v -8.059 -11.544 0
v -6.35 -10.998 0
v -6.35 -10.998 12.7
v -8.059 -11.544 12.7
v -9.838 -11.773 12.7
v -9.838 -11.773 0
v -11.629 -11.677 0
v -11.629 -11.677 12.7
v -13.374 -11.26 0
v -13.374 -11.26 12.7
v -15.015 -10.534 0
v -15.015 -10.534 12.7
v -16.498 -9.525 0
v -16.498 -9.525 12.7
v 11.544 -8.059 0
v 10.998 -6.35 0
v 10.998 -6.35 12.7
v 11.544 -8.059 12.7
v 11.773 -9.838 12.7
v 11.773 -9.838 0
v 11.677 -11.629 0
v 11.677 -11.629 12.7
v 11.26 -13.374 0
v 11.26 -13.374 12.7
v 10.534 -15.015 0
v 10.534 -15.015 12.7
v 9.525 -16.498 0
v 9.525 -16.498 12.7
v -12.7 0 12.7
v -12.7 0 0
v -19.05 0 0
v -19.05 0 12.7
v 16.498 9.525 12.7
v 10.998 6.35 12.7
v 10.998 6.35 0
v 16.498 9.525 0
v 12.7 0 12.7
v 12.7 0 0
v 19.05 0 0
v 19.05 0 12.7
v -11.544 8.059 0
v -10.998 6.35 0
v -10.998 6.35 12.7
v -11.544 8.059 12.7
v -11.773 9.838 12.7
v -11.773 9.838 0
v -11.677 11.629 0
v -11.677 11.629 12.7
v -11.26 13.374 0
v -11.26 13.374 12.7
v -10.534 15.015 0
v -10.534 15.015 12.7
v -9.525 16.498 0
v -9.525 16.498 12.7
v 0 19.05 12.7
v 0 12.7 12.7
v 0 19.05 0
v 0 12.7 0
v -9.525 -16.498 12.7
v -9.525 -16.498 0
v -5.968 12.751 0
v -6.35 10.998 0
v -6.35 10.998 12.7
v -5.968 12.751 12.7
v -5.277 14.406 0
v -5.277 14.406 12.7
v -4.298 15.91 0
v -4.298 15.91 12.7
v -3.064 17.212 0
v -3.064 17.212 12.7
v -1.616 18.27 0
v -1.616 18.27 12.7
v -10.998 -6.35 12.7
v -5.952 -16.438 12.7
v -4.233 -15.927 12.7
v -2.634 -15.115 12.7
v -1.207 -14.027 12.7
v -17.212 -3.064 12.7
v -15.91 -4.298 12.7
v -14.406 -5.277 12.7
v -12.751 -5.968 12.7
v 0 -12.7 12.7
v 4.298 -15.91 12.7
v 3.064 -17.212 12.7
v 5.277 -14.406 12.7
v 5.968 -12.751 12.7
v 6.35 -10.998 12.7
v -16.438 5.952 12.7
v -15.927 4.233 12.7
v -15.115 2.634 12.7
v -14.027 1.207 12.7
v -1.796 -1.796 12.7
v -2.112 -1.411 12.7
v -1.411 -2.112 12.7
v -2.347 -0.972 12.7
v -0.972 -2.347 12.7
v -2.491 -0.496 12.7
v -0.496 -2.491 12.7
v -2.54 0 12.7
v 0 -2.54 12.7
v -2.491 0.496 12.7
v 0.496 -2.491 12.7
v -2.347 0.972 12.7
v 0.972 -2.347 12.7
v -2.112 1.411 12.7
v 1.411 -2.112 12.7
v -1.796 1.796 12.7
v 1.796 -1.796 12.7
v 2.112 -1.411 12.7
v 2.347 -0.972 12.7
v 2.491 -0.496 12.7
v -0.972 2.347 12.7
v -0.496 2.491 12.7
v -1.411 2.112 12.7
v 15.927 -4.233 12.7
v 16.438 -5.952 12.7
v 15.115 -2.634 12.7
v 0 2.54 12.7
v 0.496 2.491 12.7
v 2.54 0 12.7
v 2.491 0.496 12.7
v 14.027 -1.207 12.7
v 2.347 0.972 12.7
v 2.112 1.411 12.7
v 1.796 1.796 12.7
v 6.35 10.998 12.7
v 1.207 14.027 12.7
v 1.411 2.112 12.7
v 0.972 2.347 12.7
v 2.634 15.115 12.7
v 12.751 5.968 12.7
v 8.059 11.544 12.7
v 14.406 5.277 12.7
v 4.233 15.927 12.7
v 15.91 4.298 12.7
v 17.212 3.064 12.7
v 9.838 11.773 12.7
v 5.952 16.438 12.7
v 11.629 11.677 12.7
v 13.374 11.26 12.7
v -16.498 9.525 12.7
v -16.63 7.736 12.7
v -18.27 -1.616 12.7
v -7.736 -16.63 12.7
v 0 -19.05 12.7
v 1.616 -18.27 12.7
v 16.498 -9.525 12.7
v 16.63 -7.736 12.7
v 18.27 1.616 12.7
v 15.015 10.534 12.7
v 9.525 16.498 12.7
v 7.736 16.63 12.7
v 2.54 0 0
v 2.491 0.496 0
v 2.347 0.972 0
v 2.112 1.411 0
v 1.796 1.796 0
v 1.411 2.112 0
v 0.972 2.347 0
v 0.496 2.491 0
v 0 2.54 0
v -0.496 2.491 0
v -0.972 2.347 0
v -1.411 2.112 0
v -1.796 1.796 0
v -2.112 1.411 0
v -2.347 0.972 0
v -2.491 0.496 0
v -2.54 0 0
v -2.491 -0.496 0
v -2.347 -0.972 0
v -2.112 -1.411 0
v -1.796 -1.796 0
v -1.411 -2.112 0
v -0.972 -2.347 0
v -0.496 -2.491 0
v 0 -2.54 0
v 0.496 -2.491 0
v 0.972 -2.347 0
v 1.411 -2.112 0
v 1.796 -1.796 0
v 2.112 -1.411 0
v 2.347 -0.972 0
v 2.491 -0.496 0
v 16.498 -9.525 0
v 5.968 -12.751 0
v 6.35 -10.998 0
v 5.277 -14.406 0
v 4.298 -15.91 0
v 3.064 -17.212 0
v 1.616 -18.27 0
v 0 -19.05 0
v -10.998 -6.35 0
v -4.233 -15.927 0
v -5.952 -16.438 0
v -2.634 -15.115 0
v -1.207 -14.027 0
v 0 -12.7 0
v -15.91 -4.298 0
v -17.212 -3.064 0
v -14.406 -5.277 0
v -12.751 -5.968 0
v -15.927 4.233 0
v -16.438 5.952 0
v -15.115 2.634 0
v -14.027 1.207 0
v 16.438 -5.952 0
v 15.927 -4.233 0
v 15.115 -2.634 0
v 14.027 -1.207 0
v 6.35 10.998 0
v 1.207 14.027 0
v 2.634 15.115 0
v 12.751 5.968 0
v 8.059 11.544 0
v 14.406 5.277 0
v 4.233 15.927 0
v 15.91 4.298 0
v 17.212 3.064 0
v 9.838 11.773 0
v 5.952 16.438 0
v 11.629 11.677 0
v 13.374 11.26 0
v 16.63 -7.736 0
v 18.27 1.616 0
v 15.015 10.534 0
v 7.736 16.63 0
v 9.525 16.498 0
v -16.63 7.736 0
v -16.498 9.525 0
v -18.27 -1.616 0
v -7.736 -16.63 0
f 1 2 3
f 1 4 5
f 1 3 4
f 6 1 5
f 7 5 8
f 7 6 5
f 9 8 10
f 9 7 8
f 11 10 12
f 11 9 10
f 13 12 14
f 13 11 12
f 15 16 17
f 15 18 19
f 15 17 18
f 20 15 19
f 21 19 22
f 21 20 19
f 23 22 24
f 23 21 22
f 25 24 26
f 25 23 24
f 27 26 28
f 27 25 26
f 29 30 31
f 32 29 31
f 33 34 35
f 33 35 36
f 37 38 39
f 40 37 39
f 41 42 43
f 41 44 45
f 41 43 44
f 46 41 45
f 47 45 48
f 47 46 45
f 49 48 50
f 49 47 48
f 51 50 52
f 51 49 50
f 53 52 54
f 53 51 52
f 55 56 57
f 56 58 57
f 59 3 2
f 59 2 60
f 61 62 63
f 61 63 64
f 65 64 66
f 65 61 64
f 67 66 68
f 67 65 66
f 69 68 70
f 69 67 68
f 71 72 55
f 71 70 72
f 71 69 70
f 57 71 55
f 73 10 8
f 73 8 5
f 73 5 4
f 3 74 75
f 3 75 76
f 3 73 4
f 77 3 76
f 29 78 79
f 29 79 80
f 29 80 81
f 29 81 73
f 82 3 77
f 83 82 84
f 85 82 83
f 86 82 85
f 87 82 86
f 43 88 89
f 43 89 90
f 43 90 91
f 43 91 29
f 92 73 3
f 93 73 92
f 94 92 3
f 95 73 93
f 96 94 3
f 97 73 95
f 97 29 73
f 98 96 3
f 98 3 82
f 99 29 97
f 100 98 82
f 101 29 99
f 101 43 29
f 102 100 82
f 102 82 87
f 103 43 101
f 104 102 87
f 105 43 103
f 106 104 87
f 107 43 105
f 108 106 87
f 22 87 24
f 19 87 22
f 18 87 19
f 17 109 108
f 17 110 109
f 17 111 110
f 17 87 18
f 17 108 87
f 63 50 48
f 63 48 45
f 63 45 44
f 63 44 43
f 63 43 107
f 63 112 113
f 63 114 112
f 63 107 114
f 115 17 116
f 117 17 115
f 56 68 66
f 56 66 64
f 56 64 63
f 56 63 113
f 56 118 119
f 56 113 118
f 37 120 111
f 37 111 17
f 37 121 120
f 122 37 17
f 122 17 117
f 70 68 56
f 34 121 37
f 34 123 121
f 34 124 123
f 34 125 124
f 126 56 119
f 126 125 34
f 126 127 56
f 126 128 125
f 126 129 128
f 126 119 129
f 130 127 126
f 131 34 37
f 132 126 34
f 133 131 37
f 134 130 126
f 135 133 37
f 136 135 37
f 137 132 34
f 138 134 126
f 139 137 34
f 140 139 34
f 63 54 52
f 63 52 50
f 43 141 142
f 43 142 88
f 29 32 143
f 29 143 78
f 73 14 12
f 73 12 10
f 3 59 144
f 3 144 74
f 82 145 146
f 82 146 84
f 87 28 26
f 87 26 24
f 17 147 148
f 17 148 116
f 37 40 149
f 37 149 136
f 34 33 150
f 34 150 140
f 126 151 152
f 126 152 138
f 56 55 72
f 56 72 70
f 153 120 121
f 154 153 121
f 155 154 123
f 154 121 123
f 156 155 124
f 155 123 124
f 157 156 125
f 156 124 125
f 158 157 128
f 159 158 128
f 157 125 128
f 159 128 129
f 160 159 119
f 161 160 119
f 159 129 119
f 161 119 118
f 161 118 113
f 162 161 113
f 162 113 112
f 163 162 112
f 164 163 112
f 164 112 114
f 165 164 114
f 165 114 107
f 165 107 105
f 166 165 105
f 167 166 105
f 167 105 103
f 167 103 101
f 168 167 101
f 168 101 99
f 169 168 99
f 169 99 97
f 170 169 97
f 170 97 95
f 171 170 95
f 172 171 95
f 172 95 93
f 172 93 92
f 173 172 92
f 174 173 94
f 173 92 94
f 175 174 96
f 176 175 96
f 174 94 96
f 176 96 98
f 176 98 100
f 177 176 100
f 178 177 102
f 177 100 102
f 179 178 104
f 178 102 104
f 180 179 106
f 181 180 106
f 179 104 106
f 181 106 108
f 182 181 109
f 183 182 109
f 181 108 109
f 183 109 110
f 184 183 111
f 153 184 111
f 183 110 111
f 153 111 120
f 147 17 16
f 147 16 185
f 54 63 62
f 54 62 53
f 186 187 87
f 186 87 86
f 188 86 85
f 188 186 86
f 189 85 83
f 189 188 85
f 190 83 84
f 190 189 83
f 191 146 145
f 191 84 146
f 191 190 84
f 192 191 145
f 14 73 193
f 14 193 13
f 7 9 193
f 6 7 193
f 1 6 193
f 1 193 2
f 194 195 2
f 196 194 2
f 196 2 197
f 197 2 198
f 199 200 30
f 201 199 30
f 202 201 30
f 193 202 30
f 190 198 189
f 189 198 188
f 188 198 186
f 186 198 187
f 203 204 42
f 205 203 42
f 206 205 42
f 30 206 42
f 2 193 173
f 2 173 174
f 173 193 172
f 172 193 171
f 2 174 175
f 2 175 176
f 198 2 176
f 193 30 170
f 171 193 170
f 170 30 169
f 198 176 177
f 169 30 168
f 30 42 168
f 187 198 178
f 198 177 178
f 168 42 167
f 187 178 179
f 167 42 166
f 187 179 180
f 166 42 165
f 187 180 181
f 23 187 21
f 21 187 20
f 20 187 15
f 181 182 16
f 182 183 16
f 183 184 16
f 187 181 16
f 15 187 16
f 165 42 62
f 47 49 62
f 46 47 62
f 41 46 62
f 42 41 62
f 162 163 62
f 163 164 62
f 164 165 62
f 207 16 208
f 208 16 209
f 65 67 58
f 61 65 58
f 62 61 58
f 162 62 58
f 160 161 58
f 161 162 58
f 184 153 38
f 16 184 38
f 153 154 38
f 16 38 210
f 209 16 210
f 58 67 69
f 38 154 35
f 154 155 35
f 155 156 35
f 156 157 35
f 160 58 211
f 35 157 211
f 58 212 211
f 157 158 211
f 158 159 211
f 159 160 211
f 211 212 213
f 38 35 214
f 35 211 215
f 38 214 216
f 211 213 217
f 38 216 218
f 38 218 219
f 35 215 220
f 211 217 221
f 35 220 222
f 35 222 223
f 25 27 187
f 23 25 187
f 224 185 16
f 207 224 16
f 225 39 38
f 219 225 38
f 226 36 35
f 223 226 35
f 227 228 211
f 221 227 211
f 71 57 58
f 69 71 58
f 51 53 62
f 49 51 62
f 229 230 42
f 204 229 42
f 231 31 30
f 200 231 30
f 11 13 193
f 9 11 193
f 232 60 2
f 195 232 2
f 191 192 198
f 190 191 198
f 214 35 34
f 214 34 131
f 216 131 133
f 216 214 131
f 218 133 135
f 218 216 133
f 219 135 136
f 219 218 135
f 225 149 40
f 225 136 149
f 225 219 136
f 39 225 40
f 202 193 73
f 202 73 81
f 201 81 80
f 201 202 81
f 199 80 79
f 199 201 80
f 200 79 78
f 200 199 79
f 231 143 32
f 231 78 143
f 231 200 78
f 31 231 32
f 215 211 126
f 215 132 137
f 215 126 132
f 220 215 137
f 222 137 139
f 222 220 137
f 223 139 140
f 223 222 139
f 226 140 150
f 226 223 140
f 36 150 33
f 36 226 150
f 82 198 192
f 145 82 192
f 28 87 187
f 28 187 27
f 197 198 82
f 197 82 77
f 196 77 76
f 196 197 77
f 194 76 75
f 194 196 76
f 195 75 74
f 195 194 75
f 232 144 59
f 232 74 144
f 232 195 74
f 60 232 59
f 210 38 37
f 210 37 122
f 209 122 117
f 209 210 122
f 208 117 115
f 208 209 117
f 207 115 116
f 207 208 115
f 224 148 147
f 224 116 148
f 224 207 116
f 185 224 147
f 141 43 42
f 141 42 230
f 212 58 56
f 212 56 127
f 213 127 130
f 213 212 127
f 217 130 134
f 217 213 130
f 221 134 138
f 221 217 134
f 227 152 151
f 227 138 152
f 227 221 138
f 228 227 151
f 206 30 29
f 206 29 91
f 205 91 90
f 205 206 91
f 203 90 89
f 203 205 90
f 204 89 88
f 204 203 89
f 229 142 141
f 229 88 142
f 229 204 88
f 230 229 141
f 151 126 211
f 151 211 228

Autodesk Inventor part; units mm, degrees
ref_plane "YZ Plane" through (0, 0, 0) normal (1, 0, 0) x (0, 1, 0)
ref_plane "XZ Plane" through (0, 0, 0) normal (0, 1, 0) x (-1, 0, 0)
ref_plane "XY Plane" through (0, 0, 0) normal (0, 0, 1) x (1, 0, 0)
sketch "Sketch1" plane through (0, 0, 0) normal (0, 0, 1) x (1, 0, 0)
  arc A0 (4.5113, -11.8717) -> (6.35, -10.9985) centre (0, 0) ccw
  line L0 (6.35, 10.9985) -> (9.525, 16.4978)
  line L1 (12.7, 0) -> (19.05, 0) construction
  line L2 (10.9985, 6.35) -> (16.4978, 9.525)
  line L3 (0, 0) -> (19.05, 0) construction
  line L4 (0, 12.7) -> (0, 19.05)
  line L5 (-6.35, 10.9985) -> (-9.525, 16.4978)
  line L6 (0, 0) -> (19.05, 0) construction
  line L7 (-10.9985, 6.35) -> (-16.4978, 9.525)
  line L8 (12.7, 0) -> (26.2861, 0) construction
  line L9 (0, 0) -> (19.05, 0)
  line L10 (-12.7, 0) -> (-19.05, 0)
  line L11 (6.35, -10.9985) -> (9.525, -16.4978)
  line L12 (10.9985, -6.35) -> (16.4978, -9.525)
  line L13 (0, -12.7) -> (0, -19.05)
  line L14 (-6.35, -10.9985) -> (-9.525, -16.4978)
  line L15 (-10.9985, -6.35) -> (-16.4978, -9.525)
  arc A1 (16.4978, -9.525) -> (12.7, 0) centre (6.7257, -7.9017) ccw
  arc A2 (19.05, 0) -> (10.9985, 6.35) centre (9.7755, -3.4802) ccw
  arc A3 (16.4978, 9.525) -> (6.35, 10.9985) centre (10.2059, 1.8738) ccw
  arc A4 (9.525, 16.4978) -> (0, 12.7) centre (7.9017, 6.7257) ccw
  arc A5 (0, -19.05) -> (6.35, -10.9985) centre (-3.4802, -9.7755) ccw
  arc A6 (9.525, -16.4978) -> (10.9985, -6.35) centre (1.8738, -10.2059) ccw
  arc A7 (0, 19.05) -> (-6.35, 10.9985) centre (3.4802, 9.7755) ccw
  arc A8 (-9.525, 16.4978) -> (-10.9985, 6.35) centre (-1.8738, 10.2059) ccw
  arc A9 (-9.525, -16.4978) -> (0, -12.7) centre (-7.9017, -6.7257) ccw
  arc A10 (-16.4978, -9.525) -> (-6.35, -10.9985) centre (-10.2059, -1.8738) ccw
  arc A11 (-19.05, 0) -> (-10.9985, -6.35) centre (-9.7755, 3.4802) ccw
  arc A12 (-16.4978, 9.525) -> (-12.7, 0) centre (-6.7257, 7.9017) ccw
  dimension "d0" = 25.4
  dimension "d1" = 19.05
  dimension "d2" = 60
  dimension "d3" = 19.05
  dimension "d4" = 30
  dimension "d5" = 19.05
  dimension "d6" = 120
  dimension "d7" = 150
  dimension "d8" = 9.906
  dimension "d9" = 9.906
  dimension "d10" = 9.906
  dimension "d11" = 9.906
  dimension "d18" = 9.906
  dimension "d19" = 9.906
  dimension "d20" = 9.906
  dimension "d21" = 9.906
  dimension "d22" = 9.906
  dimension "d23" = 9.906
  dimension "d24" = 9.906
  dimension "d25" = 9.906
extrude "Extrusion1" add sketch "Sketch1" along normal blind 12.7
sketch "Sketch2" plane through (0, 0, 12.7) normal (0, 0, 1) x (1, 0, 0)
  circle A0 centre (0, 0) radius 2.54
  dimension "d28" = 5.08
extrude "Extrusion2" cut sketch "Sketch2" against normal blind 12.7
properties part number "ratchet prototype"
